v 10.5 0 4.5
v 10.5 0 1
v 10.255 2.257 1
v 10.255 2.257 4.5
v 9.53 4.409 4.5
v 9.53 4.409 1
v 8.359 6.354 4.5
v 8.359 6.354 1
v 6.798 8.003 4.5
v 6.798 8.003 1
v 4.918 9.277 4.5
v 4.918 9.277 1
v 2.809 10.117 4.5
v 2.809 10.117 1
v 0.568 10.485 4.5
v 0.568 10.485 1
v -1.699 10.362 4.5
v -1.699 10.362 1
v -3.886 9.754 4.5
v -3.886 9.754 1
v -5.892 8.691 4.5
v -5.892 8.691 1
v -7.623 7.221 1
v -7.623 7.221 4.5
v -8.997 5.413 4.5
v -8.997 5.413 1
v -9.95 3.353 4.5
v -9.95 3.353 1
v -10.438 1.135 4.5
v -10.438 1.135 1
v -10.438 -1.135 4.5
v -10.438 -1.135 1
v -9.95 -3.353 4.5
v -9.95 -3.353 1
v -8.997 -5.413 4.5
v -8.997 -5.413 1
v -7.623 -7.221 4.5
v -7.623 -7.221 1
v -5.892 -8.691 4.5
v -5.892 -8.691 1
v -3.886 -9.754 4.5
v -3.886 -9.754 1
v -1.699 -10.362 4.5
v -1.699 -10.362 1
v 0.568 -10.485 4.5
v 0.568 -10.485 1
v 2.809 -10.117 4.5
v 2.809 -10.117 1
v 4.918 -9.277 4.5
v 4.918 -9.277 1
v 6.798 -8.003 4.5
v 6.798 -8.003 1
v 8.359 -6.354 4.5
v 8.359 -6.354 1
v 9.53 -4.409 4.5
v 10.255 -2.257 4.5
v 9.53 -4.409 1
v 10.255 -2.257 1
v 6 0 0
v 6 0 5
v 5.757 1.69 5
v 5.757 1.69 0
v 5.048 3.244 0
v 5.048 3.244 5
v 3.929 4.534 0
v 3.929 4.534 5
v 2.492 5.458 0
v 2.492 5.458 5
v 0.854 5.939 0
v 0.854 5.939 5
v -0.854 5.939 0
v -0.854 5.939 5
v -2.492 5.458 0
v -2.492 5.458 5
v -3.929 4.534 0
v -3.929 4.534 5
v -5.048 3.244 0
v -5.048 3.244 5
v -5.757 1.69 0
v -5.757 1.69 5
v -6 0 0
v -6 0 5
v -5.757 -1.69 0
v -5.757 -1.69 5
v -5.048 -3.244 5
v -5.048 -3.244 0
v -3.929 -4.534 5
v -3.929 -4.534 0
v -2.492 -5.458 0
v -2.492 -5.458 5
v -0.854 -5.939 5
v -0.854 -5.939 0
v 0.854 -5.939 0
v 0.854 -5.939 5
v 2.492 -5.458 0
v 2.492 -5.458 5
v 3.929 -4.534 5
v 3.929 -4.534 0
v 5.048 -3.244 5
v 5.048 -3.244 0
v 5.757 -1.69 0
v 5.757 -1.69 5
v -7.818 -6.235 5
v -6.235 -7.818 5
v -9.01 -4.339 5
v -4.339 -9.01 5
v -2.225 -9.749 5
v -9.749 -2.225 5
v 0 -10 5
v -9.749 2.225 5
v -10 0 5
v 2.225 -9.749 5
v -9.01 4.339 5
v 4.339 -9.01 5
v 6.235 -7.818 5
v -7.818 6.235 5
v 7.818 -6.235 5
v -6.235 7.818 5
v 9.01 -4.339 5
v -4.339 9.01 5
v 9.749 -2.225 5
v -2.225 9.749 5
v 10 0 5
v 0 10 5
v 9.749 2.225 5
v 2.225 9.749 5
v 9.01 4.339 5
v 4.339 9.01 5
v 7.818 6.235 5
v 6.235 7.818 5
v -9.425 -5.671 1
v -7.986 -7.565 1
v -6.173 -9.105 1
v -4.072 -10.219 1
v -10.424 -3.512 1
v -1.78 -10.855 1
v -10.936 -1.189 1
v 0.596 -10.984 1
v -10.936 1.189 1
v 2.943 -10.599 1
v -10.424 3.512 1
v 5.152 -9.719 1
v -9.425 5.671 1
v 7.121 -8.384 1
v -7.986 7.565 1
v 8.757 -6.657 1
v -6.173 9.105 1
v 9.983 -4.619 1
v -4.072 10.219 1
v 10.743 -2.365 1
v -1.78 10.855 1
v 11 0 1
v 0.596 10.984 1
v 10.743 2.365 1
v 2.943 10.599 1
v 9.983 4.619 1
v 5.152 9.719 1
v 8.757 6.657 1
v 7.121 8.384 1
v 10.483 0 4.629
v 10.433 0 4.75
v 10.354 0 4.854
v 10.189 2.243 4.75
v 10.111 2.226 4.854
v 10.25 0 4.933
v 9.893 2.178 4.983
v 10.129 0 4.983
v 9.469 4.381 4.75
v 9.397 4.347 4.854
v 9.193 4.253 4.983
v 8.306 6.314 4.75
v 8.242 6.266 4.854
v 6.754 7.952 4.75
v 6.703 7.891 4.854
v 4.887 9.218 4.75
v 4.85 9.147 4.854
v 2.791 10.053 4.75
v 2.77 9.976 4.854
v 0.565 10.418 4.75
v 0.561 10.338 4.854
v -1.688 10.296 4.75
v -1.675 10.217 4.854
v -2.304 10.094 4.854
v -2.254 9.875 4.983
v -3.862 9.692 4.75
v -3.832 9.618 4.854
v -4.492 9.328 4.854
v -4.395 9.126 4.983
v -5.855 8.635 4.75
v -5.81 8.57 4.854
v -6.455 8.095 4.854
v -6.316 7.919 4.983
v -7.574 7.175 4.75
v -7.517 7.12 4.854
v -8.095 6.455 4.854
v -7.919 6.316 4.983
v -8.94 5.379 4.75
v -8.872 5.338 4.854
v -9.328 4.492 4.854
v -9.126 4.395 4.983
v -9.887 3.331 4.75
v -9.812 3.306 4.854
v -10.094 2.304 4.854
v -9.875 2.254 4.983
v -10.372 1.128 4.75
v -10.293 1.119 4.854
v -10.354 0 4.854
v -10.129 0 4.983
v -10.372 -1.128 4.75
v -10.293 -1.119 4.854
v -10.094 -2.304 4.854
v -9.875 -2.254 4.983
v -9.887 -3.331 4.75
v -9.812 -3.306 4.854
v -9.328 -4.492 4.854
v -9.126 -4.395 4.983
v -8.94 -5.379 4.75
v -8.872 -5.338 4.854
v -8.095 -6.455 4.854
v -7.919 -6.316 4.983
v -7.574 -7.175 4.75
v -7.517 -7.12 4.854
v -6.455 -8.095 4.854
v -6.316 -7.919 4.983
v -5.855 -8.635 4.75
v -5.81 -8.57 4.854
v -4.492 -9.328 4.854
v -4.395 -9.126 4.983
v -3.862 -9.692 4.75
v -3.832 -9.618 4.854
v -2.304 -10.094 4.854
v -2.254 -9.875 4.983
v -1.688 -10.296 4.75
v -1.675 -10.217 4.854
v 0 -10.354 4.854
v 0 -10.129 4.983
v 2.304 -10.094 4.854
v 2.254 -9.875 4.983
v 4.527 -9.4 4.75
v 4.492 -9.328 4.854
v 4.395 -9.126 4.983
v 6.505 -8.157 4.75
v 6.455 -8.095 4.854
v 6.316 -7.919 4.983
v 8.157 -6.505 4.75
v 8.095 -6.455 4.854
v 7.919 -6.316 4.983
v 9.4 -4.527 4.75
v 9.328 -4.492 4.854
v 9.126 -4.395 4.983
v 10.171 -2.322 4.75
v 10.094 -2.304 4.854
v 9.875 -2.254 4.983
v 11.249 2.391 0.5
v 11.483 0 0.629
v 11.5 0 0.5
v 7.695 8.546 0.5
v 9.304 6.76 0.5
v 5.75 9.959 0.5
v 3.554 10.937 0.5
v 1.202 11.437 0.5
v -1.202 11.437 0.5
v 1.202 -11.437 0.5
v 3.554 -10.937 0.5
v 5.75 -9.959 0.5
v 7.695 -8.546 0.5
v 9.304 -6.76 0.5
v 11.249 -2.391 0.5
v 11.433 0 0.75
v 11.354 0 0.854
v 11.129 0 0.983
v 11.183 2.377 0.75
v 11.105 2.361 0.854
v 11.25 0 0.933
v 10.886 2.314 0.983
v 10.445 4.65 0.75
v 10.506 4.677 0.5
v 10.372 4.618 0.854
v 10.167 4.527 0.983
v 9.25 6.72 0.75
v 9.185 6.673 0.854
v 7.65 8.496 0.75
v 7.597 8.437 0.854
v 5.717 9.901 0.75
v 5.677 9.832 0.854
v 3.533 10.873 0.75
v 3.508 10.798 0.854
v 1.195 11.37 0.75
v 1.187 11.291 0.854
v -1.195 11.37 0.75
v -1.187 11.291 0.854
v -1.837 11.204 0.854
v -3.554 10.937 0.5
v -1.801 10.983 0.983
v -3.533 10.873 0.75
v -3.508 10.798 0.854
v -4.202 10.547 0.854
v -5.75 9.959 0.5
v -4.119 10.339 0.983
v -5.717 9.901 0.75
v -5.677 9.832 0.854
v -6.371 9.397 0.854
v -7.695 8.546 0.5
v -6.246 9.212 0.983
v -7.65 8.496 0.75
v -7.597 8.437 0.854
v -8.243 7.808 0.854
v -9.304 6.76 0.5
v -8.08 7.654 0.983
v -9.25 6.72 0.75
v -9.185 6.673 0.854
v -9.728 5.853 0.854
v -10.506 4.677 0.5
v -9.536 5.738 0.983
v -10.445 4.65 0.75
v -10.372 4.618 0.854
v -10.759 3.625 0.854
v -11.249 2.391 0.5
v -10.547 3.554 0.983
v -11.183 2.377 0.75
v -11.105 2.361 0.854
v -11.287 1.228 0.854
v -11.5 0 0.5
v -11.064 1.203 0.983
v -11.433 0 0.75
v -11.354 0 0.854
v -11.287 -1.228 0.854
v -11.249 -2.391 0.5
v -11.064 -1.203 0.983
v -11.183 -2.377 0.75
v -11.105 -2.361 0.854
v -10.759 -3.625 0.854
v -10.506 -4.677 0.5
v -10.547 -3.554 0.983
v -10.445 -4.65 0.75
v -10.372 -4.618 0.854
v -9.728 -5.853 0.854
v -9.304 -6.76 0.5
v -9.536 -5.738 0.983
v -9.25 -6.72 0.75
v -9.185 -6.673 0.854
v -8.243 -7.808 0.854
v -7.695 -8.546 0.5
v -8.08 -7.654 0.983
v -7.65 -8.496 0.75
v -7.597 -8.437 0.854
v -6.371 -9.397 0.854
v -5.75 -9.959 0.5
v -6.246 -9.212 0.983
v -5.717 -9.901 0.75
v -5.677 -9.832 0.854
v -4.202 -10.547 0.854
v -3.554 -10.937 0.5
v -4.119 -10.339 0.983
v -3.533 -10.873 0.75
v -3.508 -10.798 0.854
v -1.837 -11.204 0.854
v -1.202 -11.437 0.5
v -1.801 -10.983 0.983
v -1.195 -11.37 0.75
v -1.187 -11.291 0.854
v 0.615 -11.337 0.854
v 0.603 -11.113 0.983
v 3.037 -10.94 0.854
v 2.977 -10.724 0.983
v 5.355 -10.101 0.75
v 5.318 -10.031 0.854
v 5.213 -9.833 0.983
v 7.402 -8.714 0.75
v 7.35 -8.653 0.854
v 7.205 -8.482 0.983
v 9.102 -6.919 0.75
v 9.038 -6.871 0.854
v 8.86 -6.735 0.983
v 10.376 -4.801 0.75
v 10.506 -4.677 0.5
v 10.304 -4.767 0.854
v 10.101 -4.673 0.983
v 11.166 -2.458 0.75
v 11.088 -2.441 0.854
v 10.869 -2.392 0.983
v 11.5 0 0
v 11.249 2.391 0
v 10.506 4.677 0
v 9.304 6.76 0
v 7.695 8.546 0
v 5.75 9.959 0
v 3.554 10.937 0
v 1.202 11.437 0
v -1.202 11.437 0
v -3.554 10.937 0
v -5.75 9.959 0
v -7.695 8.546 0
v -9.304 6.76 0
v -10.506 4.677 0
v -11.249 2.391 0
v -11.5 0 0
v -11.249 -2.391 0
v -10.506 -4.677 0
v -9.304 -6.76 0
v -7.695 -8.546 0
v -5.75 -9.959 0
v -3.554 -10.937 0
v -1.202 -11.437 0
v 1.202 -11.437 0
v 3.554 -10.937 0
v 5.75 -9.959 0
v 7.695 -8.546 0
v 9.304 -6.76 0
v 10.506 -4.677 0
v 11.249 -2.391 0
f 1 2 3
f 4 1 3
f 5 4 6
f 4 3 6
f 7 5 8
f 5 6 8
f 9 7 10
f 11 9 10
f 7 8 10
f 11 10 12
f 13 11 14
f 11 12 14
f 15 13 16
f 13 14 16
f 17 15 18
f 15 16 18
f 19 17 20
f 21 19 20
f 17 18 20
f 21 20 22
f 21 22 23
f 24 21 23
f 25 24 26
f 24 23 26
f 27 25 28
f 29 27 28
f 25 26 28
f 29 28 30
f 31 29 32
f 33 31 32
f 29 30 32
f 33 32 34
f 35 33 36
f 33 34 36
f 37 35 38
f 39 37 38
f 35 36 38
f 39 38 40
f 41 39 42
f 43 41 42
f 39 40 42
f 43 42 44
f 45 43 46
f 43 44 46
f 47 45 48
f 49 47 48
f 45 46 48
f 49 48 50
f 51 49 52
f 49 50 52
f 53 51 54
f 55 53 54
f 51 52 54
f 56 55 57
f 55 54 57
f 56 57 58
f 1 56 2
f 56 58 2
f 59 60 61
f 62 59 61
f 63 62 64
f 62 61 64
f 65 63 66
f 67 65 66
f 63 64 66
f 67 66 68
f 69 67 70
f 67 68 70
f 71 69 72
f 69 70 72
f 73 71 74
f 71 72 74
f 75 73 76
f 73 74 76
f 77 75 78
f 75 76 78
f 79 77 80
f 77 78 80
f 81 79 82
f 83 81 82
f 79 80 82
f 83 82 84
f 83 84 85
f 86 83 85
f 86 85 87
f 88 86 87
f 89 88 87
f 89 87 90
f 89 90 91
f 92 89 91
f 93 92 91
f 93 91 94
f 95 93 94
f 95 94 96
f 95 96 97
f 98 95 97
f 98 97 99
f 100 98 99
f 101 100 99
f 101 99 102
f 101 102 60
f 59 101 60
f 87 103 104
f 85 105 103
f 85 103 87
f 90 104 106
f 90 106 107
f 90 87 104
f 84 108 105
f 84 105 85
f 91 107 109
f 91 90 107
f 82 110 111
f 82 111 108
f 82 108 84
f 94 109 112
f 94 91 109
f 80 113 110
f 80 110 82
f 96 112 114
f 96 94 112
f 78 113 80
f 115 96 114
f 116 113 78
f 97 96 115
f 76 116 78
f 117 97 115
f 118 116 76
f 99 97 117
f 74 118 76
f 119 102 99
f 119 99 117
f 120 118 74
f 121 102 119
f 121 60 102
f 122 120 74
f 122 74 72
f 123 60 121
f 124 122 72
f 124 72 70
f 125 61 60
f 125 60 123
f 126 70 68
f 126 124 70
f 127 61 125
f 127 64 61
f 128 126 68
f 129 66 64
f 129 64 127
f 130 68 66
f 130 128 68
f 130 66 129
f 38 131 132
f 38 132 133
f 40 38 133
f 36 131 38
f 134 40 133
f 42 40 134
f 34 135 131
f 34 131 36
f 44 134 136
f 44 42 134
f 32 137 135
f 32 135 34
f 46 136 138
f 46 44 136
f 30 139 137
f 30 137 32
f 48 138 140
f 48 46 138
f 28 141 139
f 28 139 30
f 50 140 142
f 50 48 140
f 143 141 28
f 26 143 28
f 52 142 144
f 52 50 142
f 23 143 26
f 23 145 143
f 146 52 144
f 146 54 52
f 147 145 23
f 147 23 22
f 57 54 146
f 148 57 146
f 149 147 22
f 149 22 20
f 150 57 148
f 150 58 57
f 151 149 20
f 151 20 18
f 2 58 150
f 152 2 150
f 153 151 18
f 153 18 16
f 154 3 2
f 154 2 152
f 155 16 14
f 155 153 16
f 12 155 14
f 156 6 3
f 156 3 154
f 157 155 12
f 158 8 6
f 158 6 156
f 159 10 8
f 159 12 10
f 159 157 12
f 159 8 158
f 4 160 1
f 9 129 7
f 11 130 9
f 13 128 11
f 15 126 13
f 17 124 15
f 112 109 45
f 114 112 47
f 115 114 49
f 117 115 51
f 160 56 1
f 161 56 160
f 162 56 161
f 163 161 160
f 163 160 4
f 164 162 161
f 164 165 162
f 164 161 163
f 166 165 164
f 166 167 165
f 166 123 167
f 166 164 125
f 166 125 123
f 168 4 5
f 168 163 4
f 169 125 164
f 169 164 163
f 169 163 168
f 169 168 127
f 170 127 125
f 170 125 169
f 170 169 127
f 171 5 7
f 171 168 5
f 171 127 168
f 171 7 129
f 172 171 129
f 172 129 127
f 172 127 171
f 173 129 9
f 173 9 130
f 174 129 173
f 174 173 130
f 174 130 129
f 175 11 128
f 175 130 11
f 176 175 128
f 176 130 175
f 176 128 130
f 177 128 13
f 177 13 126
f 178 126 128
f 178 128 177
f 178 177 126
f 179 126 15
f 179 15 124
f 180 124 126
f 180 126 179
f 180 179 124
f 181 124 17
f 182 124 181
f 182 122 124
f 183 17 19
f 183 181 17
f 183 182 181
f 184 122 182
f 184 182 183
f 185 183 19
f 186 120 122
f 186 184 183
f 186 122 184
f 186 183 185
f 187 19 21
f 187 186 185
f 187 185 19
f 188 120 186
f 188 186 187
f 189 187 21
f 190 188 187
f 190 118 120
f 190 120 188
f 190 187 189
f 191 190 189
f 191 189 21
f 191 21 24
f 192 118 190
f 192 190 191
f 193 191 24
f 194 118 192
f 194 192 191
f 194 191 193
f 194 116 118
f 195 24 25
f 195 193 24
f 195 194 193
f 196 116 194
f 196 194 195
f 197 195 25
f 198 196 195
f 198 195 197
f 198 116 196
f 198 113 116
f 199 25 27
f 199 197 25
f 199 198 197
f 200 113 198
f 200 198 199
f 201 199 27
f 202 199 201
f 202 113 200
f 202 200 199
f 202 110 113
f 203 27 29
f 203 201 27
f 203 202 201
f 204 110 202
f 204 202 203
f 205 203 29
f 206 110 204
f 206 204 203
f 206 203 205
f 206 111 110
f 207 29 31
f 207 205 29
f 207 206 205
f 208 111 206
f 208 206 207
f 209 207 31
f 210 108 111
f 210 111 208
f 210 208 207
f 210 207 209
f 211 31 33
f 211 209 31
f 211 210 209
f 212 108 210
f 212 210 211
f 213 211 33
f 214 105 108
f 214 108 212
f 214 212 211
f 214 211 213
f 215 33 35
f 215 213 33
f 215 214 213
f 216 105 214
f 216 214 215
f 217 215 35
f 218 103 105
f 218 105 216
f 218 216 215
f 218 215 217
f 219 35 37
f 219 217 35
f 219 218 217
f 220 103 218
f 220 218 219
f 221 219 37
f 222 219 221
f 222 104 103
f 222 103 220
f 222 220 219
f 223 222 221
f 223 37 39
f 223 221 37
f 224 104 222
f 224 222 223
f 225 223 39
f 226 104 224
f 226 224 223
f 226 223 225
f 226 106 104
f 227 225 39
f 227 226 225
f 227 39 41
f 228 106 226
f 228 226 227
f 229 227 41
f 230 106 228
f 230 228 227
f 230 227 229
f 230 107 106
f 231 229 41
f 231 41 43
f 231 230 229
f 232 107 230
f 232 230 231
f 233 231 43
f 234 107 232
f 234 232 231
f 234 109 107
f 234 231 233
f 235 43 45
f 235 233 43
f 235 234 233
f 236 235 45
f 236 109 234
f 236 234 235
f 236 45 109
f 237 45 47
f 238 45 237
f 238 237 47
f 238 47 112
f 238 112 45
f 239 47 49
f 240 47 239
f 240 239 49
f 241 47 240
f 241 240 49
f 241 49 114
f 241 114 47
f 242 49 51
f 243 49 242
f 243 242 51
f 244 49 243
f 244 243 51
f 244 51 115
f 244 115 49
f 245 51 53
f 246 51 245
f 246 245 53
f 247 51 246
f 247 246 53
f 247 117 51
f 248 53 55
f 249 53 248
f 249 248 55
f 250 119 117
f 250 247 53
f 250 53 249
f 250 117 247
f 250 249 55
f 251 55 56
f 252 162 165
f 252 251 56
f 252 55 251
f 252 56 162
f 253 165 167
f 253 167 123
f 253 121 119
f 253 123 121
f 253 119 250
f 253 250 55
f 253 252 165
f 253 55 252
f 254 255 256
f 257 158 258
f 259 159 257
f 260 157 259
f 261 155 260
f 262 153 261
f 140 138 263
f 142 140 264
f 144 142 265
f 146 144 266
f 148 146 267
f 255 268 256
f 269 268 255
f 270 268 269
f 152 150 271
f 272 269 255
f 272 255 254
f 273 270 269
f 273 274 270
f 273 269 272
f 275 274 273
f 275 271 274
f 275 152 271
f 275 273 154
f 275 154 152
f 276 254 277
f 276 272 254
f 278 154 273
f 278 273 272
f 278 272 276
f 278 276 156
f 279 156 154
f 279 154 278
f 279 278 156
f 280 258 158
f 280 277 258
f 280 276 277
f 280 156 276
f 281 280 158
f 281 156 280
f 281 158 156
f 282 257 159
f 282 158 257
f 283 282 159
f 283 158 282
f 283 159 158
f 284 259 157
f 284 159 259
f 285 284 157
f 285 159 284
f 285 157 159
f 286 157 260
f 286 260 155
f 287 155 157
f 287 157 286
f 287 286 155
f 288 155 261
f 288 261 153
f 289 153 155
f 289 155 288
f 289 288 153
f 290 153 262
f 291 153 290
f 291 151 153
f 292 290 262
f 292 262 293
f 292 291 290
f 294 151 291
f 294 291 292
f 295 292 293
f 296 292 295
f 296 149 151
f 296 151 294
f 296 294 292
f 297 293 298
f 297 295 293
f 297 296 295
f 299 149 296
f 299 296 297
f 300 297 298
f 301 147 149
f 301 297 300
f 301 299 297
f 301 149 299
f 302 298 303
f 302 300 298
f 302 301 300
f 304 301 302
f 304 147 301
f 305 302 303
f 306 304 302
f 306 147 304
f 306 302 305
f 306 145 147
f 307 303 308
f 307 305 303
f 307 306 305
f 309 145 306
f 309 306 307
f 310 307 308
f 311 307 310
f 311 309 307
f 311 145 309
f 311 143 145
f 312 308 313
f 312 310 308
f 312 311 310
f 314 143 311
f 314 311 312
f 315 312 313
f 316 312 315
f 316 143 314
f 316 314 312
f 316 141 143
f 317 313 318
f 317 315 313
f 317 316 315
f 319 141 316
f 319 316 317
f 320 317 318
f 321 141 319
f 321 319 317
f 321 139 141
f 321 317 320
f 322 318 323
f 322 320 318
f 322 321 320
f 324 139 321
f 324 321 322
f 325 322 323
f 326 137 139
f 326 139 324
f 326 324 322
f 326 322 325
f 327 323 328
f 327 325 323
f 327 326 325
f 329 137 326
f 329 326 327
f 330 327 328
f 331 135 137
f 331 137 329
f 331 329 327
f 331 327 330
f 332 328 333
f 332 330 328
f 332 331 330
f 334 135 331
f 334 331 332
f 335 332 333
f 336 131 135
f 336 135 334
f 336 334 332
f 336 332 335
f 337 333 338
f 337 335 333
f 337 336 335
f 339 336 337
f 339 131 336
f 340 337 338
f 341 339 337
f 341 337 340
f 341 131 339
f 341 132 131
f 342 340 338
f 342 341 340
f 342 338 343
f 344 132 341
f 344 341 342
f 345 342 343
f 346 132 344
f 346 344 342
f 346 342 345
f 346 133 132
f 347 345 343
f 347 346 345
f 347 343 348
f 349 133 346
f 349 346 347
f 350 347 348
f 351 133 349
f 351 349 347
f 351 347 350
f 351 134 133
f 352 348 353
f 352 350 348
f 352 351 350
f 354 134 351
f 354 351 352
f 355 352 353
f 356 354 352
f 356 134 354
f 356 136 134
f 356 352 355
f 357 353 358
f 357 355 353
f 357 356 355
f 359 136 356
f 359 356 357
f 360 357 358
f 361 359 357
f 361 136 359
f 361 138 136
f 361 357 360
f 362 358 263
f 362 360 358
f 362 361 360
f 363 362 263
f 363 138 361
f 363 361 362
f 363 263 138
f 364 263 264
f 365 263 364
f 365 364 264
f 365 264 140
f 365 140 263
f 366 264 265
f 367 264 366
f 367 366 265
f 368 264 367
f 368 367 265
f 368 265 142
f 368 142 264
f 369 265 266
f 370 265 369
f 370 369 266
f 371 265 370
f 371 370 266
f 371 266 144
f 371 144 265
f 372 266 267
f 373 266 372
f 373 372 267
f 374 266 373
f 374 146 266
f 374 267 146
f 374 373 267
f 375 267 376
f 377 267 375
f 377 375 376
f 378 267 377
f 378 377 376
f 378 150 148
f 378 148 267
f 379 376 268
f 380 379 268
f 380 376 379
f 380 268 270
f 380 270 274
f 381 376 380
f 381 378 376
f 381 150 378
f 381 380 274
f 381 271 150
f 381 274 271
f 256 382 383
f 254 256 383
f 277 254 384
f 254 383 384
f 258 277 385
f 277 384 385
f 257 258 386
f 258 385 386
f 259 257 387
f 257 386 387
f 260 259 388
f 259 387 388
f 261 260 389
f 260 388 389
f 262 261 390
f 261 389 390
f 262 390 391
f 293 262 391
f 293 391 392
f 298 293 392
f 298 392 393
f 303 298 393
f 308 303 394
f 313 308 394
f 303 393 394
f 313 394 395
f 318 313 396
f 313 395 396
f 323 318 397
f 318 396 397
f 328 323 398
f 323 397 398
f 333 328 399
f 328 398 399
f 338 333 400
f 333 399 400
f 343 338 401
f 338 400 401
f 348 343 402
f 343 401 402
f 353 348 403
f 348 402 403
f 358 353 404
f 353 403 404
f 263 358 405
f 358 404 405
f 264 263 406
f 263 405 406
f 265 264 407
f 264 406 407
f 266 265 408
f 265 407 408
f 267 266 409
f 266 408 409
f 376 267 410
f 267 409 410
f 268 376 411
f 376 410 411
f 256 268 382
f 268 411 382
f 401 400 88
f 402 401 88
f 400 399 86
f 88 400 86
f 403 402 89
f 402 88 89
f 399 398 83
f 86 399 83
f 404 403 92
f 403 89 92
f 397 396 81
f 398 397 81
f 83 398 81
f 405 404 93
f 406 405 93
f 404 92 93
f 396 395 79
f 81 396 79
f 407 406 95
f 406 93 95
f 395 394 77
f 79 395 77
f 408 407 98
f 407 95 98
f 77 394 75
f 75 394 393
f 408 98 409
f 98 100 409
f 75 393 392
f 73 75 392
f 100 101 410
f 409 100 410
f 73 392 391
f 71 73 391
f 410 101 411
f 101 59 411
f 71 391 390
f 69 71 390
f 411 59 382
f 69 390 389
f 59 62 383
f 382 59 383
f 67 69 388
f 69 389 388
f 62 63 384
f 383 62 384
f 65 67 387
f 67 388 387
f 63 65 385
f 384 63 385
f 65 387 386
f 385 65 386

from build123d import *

# Parameters (mm, degrees)
SKETCH_1_R          = 11.5
EXTRUDE_1_DEPTH     = 1
SKETCH_2_R          = 10.5
EXTRUDE_2_DEPTH     = 4
SKETCH_3_R          = 6
CUT_EXTRUDE_1_DEPTH = 9
FILLET_1_R          = 0.5


with BuildPart() as part:
    # ｽｹｯﾁ1 → ﾎﾞｽ - 押し出し1 (new body)
    with BuildSketch(Plane.XY):
        Circle(SKETCH_1_R)
    extrude(amount=EXTRUDE_1_DEPTH)

    # ｽｹｯﾁ2 → ﾎﾞｽ - 押し出し2 (add)
    with BuildSketch(Plane.XY.offset(1)):
        Circle(SKETCH_2_R)
    extrude(amount=EXTRUDE_2_DEPTH)

    # ｽｹｯﾁ3 → ｶｯﾄ - 押し出し1 (cut)
    with BuildSketch(Plane.XY.offset(5)):
        Circle(SKETCH_3_R)
    extrude(amount=-CUT_EXTRUDE_1_DEPTH, mode=Mode.SUBTRACT)

    # ﾌｨﾚｯﾄ1
    fillet_1_edges = [part.edges().sort_by_distance(p)[0] for p in [
        (-11.5, 0, 1),
        (-10.5, 0, 5),
    ]]
    fillet(fillet_1_edges, radius=FILLET_1_R)


solid = part.part
